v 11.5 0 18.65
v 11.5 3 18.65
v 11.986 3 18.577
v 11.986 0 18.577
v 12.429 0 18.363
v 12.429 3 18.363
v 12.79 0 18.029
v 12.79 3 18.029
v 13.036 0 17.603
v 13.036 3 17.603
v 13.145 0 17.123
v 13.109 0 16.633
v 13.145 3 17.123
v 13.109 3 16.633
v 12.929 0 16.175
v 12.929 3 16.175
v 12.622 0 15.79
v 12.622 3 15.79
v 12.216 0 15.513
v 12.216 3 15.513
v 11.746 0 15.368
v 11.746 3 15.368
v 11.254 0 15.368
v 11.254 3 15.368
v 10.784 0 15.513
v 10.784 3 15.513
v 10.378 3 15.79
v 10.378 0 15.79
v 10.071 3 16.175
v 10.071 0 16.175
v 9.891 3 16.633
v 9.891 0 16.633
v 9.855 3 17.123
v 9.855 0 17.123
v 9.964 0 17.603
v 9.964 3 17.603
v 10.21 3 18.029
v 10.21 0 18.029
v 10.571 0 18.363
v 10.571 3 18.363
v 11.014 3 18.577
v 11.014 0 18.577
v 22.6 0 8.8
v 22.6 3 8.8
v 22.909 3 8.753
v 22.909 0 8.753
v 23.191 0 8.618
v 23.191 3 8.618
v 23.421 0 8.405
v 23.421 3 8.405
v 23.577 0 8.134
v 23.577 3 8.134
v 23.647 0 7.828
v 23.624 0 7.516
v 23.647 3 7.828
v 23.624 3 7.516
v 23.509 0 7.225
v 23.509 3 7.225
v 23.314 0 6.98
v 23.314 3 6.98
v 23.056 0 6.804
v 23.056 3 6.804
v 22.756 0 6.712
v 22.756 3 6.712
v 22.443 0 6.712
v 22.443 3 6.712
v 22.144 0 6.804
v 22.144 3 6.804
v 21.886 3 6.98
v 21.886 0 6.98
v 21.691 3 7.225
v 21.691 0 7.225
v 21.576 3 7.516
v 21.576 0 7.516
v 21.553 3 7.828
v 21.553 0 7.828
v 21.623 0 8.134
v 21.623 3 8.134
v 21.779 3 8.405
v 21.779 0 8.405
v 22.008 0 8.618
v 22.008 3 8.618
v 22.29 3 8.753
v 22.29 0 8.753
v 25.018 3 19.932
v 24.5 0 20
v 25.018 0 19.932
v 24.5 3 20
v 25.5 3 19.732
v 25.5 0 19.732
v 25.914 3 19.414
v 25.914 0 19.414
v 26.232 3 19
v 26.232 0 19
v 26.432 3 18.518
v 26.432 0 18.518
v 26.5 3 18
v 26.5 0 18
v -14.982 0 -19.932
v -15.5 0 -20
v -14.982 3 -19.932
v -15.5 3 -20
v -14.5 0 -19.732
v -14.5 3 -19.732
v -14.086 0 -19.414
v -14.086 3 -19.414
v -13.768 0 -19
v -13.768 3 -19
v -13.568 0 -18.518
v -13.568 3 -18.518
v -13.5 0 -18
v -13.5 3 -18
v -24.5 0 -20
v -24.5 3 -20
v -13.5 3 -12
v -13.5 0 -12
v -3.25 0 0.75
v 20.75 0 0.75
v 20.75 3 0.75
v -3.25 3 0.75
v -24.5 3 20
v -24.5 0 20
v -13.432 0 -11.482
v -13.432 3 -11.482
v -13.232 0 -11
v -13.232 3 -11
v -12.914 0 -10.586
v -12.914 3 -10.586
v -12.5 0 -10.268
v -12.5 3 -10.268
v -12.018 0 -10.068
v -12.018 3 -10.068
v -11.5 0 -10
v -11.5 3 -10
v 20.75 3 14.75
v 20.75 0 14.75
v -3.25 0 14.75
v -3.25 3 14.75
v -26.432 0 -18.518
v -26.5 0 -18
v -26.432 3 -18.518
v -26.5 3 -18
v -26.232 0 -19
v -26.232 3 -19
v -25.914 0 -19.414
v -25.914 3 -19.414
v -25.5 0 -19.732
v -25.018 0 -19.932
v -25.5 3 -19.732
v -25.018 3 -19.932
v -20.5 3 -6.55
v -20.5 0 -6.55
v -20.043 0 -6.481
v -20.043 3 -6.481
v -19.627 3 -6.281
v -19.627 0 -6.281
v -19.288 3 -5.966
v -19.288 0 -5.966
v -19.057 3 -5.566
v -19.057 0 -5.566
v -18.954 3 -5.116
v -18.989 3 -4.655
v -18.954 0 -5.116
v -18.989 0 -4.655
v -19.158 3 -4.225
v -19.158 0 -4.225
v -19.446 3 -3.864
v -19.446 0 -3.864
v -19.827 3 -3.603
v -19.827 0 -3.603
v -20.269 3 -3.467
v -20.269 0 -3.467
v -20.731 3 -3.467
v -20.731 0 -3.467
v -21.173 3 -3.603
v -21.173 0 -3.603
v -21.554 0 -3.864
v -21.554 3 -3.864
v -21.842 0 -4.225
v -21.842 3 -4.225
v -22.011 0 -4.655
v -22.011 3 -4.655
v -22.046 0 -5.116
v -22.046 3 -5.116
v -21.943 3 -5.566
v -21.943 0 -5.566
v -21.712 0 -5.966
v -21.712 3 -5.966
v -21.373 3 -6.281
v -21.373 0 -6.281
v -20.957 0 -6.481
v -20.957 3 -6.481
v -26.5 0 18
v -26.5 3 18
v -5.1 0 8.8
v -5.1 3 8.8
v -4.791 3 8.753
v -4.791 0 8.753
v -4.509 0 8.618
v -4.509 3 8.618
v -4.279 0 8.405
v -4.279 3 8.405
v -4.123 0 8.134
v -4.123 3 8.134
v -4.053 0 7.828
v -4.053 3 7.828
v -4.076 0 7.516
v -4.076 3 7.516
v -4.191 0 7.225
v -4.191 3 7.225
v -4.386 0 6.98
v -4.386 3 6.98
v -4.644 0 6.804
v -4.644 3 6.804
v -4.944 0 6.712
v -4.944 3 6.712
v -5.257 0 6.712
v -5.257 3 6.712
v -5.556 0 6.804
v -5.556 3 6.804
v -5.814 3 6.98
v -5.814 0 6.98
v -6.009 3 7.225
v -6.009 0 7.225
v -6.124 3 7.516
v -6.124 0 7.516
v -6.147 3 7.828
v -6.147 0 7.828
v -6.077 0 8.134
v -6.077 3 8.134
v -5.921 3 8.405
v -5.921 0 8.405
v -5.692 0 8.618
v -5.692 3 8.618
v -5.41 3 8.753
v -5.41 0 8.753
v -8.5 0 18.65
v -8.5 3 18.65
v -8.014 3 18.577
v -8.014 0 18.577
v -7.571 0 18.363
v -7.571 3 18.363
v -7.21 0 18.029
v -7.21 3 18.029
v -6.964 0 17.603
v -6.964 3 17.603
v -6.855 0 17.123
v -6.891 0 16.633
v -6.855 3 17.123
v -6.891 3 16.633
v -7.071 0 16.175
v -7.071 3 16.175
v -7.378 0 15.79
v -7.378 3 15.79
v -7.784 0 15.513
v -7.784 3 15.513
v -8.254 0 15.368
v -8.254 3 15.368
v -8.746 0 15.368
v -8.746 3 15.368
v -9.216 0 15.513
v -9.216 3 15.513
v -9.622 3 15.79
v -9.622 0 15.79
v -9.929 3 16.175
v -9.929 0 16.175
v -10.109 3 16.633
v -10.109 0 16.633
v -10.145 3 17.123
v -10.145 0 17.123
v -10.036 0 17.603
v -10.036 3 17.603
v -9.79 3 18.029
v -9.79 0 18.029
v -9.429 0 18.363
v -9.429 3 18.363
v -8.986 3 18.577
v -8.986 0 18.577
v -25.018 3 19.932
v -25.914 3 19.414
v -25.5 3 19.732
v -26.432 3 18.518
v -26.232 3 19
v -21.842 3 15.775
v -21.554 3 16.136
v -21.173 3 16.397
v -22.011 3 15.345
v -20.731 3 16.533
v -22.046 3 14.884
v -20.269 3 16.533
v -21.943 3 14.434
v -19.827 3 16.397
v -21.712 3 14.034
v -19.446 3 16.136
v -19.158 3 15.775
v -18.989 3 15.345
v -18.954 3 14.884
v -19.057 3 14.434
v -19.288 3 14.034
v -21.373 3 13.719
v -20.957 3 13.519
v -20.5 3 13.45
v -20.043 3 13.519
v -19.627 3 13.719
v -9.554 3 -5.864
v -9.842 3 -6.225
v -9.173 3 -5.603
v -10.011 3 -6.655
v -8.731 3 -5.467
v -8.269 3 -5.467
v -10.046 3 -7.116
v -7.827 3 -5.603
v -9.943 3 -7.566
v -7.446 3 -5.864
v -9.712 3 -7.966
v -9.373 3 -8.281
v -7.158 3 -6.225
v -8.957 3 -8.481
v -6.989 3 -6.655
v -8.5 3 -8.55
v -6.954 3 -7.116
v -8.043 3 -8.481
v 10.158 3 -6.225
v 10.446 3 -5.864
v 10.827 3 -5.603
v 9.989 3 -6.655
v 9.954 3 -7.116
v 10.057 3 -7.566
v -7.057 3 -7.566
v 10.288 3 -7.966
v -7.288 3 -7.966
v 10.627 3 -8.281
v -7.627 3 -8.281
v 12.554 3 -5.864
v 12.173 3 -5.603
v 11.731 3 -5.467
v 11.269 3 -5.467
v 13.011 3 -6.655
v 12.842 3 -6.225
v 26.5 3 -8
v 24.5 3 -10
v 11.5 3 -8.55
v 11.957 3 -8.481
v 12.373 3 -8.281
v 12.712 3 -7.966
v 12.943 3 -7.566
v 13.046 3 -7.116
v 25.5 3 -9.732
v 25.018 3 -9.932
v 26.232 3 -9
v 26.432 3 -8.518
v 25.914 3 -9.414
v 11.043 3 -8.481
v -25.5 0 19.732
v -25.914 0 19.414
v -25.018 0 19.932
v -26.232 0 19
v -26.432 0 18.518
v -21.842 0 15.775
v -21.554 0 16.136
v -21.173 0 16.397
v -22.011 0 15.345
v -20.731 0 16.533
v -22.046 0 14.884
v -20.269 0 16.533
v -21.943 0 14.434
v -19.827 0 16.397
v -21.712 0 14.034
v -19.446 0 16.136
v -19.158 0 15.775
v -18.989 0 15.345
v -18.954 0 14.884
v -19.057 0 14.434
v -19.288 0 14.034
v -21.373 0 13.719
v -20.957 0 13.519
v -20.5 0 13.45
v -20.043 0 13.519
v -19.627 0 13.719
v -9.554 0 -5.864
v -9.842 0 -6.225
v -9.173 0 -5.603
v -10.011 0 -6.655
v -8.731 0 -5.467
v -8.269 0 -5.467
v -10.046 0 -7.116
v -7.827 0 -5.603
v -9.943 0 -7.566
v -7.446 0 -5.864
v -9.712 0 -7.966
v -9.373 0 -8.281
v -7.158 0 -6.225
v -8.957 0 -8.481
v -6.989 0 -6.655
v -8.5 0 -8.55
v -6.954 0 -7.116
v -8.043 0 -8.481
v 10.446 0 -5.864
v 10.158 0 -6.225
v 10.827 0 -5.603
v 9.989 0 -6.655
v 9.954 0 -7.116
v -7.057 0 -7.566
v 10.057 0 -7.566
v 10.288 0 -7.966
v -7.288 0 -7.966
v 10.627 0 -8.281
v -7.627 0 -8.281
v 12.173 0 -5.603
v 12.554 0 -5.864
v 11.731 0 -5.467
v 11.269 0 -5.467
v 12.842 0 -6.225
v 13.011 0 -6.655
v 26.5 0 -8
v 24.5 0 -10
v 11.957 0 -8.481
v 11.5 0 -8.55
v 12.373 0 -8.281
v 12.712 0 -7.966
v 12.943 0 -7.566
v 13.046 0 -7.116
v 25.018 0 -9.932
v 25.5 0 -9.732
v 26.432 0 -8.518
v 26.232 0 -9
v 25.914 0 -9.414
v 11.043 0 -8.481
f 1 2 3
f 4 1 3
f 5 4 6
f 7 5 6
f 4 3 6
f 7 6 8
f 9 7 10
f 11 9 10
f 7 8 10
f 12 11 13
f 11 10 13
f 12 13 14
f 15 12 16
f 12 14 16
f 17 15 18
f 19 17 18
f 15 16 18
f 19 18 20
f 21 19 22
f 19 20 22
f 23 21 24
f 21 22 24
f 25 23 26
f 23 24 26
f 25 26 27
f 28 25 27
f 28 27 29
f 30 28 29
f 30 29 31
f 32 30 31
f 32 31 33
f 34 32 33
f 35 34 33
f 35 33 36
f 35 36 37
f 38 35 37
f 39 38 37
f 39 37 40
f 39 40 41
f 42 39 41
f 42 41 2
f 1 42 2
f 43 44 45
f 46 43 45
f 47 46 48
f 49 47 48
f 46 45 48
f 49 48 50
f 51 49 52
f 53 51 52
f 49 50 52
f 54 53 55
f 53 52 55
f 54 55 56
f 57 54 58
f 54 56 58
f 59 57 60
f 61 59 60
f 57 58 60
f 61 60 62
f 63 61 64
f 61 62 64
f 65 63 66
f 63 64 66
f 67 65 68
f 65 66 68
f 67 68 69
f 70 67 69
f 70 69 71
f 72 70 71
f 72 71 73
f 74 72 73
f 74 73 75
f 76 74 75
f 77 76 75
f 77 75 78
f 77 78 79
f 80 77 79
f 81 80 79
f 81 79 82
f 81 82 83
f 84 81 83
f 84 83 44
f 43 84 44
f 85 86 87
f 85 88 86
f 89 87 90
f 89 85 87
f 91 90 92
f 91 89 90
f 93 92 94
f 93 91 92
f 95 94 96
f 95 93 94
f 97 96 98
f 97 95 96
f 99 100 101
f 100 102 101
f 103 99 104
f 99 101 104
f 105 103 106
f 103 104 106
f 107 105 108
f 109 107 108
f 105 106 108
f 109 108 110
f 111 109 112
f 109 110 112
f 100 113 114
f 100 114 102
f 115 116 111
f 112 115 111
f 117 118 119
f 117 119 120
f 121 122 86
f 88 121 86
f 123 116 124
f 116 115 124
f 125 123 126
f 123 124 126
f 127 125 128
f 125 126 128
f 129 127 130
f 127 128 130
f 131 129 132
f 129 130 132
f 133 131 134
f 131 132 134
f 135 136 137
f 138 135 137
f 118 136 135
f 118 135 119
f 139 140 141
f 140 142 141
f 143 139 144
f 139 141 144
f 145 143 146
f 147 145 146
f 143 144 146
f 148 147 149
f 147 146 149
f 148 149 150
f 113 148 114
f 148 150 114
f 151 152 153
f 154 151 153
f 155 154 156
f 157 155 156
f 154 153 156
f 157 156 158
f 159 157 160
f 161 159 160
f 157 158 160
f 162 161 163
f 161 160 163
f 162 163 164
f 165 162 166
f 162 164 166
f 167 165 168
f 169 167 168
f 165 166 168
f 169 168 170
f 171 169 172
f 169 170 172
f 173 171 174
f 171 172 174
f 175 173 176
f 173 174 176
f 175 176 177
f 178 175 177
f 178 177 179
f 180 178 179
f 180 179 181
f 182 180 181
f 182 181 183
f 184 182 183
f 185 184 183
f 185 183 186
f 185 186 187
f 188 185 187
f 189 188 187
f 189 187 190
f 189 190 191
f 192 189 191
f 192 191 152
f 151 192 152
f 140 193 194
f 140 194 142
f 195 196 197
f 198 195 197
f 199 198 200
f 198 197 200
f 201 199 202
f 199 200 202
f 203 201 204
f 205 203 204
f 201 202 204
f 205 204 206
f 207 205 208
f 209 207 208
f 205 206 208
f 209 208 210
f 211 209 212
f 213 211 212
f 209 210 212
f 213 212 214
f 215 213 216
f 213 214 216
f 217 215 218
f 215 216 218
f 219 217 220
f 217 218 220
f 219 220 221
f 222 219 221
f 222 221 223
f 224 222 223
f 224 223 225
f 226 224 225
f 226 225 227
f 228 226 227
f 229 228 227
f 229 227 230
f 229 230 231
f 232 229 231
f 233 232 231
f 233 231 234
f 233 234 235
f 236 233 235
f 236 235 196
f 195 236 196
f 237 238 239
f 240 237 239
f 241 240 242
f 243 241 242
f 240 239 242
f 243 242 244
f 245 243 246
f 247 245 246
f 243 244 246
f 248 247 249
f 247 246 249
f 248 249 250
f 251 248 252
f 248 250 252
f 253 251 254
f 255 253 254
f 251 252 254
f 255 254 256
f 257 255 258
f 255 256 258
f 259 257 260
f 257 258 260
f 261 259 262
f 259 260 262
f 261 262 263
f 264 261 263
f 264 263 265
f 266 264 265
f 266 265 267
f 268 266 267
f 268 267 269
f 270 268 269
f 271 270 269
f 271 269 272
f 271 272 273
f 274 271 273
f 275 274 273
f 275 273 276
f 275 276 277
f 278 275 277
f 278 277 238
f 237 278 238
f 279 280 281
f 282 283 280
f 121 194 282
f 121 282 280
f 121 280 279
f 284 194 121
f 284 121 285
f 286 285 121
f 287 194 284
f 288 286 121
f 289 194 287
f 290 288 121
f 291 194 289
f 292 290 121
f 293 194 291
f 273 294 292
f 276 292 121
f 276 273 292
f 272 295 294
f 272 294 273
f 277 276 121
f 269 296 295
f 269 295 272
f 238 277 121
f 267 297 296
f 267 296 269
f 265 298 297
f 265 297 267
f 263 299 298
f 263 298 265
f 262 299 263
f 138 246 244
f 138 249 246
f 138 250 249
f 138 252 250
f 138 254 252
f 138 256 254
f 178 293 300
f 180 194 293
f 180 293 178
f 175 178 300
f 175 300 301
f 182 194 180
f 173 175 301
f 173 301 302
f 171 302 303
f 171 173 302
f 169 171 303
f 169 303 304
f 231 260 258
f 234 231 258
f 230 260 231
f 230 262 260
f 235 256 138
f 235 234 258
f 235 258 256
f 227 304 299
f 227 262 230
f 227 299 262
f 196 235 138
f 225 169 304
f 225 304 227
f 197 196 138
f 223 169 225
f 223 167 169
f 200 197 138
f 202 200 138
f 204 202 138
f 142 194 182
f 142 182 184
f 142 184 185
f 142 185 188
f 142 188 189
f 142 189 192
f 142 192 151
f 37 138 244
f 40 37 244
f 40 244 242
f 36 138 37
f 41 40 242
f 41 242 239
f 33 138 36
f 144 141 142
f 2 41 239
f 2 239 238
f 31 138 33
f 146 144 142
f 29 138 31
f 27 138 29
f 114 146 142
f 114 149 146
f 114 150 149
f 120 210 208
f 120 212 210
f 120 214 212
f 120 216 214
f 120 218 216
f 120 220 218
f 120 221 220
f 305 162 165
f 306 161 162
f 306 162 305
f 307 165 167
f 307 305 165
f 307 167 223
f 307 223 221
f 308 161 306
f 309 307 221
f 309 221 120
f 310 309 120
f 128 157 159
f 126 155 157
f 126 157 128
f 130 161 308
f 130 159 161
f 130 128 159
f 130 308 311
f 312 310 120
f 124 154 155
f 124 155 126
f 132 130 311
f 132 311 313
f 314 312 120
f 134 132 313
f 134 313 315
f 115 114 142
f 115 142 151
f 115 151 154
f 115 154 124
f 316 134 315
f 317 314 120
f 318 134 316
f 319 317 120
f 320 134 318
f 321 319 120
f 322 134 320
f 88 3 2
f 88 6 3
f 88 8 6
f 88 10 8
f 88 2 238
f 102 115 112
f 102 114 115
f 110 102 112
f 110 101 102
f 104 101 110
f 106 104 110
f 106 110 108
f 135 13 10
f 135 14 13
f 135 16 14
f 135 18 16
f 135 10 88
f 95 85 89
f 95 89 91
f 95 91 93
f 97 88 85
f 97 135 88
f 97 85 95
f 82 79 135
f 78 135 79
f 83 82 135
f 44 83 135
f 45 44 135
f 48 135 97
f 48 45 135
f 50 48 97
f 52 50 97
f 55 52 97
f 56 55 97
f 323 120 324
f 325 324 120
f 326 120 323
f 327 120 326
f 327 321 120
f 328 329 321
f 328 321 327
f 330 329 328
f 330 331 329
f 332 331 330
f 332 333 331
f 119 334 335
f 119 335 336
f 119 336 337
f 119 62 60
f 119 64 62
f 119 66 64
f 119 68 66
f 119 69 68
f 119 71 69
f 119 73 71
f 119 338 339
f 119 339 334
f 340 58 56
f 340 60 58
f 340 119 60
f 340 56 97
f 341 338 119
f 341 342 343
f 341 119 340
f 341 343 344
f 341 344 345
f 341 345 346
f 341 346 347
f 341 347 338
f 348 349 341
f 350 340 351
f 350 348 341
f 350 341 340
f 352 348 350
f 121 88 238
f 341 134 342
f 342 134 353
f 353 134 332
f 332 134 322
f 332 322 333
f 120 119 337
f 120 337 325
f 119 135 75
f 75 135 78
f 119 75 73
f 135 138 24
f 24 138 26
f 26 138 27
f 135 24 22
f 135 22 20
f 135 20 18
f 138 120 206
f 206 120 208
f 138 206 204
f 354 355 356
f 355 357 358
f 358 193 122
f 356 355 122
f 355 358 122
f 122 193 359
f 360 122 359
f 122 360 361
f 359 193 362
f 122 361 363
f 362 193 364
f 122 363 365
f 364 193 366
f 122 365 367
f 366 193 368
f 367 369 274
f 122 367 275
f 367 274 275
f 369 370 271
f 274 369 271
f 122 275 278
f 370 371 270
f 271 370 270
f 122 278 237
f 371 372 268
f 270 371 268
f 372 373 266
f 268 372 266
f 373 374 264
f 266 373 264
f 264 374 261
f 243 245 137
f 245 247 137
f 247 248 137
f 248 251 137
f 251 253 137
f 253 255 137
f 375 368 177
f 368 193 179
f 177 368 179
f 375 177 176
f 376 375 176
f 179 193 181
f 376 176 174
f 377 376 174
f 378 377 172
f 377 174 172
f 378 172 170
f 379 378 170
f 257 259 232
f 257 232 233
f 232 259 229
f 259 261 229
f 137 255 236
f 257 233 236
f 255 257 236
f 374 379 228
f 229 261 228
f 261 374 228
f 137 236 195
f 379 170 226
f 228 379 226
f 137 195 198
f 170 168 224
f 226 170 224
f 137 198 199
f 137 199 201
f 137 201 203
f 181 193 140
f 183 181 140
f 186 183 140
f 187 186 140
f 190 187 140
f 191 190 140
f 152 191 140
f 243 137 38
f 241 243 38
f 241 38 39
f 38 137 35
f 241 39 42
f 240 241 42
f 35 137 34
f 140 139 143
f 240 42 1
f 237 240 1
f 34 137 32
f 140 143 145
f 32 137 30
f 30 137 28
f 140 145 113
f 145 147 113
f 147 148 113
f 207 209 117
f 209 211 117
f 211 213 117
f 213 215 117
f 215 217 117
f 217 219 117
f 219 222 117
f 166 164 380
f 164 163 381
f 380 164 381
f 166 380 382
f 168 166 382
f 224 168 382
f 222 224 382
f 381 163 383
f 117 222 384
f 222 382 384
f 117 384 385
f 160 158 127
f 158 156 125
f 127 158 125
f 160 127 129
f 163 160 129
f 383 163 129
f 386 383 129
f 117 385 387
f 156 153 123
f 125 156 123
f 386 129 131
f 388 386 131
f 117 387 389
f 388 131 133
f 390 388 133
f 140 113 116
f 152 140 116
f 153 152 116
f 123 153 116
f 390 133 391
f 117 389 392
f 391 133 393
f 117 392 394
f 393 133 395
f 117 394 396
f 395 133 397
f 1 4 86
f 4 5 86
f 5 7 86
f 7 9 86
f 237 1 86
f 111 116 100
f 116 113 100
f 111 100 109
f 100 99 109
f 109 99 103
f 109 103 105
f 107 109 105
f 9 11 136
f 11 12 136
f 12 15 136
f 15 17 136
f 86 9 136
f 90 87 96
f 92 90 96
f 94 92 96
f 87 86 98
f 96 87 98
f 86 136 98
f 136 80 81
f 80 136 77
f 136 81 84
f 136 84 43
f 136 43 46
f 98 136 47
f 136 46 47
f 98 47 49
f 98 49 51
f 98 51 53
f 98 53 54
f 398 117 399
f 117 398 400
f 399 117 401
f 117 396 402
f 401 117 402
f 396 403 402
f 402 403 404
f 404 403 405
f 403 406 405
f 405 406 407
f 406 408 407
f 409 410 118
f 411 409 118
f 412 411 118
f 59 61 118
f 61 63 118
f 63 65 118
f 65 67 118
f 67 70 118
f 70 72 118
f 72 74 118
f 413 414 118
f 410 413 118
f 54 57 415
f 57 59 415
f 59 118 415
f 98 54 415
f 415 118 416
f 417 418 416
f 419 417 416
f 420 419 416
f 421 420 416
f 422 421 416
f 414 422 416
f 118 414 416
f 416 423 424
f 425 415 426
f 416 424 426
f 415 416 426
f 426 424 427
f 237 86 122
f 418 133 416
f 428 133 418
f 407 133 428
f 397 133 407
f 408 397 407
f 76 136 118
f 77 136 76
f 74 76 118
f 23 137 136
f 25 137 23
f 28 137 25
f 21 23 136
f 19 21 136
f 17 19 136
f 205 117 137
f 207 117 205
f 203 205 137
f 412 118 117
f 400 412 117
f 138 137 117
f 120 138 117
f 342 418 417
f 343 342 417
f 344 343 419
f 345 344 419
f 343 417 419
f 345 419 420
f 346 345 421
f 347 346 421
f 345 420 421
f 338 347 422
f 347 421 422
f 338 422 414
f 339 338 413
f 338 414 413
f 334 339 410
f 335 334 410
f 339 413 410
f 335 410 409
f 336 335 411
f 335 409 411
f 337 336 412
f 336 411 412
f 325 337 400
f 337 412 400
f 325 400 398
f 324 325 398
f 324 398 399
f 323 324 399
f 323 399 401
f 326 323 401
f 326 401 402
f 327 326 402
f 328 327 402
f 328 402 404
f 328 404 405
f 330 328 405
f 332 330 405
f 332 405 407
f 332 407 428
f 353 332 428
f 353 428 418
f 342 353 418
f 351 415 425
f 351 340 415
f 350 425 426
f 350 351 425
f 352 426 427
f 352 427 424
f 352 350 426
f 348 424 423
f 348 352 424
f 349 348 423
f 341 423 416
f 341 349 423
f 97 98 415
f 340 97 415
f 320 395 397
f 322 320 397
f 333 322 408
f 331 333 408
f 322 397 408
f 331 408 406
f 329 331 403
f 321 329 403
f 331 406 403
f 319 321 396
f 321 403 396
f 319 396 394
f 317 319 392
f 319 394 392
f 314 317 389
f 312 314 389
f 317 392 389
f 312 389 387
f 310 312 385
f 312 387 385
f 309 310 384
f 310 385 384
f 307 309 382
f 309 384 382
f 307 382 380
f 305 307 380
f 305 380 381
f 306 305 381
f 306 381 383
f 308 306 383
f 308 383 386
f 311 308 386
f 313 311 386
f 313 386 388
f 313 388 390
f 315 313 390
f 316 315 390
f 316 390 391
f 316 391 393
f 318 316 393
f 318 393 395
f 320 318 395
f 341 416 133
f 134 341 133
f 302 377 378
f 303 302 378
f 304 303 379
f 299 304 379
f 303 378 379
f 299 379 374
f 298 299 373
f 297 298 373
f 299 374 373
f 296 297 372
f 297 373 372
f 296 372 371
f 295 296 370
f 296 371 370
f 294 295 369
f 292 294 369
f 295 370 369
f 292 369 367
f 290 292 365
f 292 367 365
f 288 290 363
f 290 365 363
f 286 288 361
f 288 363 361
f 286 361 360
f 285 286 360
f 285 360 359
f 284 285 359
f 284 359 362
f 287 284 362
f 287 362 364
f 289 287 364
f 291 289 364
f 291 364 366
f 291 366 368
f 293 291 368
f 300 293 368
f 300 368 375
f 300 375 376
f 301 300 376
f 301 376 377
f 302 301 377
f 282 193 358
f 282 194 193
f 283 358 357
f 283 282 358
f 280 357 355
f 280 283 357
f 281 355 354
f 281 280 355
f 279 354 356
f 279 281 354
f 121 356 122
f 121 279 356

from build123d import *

# Parameters (mm, degrees)
SKETCH_1_W          = 53
SKETCH_1_H          = 40
EXTRUDE_1_DEPTH     = 3
SKETCH_2_R          = 1.55
CUT_EXTRUDE_1_DEPTH = 10
SKETCH_4_R          = 1.65
CUT_EXTRUDE_2_DEPTH = 10
SKETCH_5_R          = 1.05
CUT_EXTRUDE_3_DEPTH = 10
SKETCH_6_W          = 23
SKETCH_6_H          = 12.5
CUT_EXTRUDE_4_DEPTH = 10
SKETCH_7_W          = 24
SKETCH_7_H          = 14
CUT_EXTRUDE_5_DEPTH = 10
SKETCH_8_W          = 40
SKETCH_8_H          = 10
CUT_EXTRUDE_6_DEPTH = 10
SKETCH_9_R          = 1.55
CUT_EXTRUDE_7_DEPTH = 10
FILLET_1_R          = 2


with BuildPart() as part:
    # 草图1 → 凸台-拉伸1 (new body)
    with BuildSketch(Plane(origin=(0, 0, 0), x_dir=(1, 0, 0), z_dir=(0, 1, 0))):
        Rectangle(SKETCH_1_W, SKETCH_1_H)
    extrude(amount=EXTRUDE_1_DEPTH)

    # 草图2 → 切除-拉伸1 (cut)
    with BuildSketch(Plane(origin=(0, 0, 0), x_dir=(-1, 0, 0), z_dir=(0, -1, 0))):
        with Locations(Location((20.5, -15, 0), (0, 0, 90))):
            Circle(SKETCH_2_R)
        with Locations(Location((20.5, 5, 0), (0, 0, 90))):
            Circle(SKETCH_2_R)
    extrude(amount=-CUT_EXTRUDE_1_DEPTH, mode=Mode.SUBTRACT)

    # 草图4 → 切除-拉伸2 (cut)
    with BuildSketch(Plane(origin=(0, 3, 0), x_dir=(1, 0, 0), z_dir=(0, 1, 0))):
        with Locations(Location((-8.5, -17, 0), (0, 0, 270))):
            Circle(SKETCH_4_R)
        with Locations(Location((11.5, -17, 0), (0, 0, 270))):
            Circle(SKETCH_4_R)
        with Locations(Location((-0.5, 17, 0), (0, 0, 270))):
            Circle(SKETCH_4_R)
        with Locations(Location((19.5, 17, 0), (0, 0, 270))):
            Circle(SKETCH_4_R)
    extrude(amount=-CUT_EXTRUDE_2_DEPTH, mode=Mode.SUBTRACT)

    # 草图5 → 切除-拉伸3 (cut)
    with BuildSketch(Plane(origin=(0, 3, 0), x_dir=(1, 0, 0), z_dir=(0, 1, 0))):
        with Locations(Location((22.599975, -7.75, 0), (0, 0, 270))):
            Circle(SKETCH_5_R)
        with Locations(Location((-5.100025, -7.75, 0), (0, 0, 270))):
            Circle(SKETCH_5_R)
    extrude(amount=-CUT_EXTRUDE_3_DEPTH, mode=Mode.SUBTRACT)

    # 草图6 → 切除-拉伸4 (cut)
    with BuildSketch(Plane(origin=(0, 0, 0), x_dir=(-1, 0, 0), z_dir=(0, -1, 0))):
        with Locations((-8.749975, -7.75)):
            Rectangle(SKETCH_6_W, SKETCH_6_H)
    extrude(amount=-CUT_EXTRUDE_4_DEPTH, mode=Mode.SUBTRACT)

    # 草图7 → 切除-拉伸5 (cut)
    with BuildSketch(Plane(origin=(0, 0, 0), x_dir=(-1, 0, 0), z_dir=(0, -1, 0))):
        with Locations((-8.749975, -7.75)):
            Rectangle(SKETCH_7_W, SKETCH_7_H)
    extrude(amount=-CUT_EXTRUDE_5_DEPTH, mode=Mode.SUBTRACT)

    # 草图8 → 切除-拉伸6 (cut)
    with BuildSketch(Plane(origin=(0, 0, 0), x_dir=(-1, 0, 0), z_dir=(0, -1, 0))):
        with Locations((-6.5, 15)):
            Rectangle(SKETCH_8_W, SKETCH_8_H)
    extrude(amount=-CUT_EXTRUDE_6_DEPTH, mode=Mode.SUBTRACT)

    # 草图9 → 切除-拉伸7 (cut)
    with BuildSketch(Plane(origin=(0, 0, 0), x_dir=(-1, 0, 0), z_dir=(0, -1, 0))):
        with Locations(Location((-11.5, 7, 0), (0, 0, 90))):
            Circle(SKETCH_9_R)
        with Locations(Location((8.5, 7, 0), (0, 0, 90))):
            Circle(SKETCH_9_R)
    extrude(amount=-CUT_EXTRUDE_7_DEPTH, mode=Mode.SUBTRACT)

    # 圆角1
    fillet_1_edges = [part.edges().sort_by_distance(p)[0] for p in [
        (26.5, 1.5, -10),
        (-13.5, 1.5, -20),
        (-13.5, 1.5, -10),
        (26.5, 1.5, 20),
        (-26.5, 1.5, 20),
        (-26.5, 1.5, -20),
    ]]
    fillet(fillet_1_edges, radius=FILLET_1_R)


solid = part.part
